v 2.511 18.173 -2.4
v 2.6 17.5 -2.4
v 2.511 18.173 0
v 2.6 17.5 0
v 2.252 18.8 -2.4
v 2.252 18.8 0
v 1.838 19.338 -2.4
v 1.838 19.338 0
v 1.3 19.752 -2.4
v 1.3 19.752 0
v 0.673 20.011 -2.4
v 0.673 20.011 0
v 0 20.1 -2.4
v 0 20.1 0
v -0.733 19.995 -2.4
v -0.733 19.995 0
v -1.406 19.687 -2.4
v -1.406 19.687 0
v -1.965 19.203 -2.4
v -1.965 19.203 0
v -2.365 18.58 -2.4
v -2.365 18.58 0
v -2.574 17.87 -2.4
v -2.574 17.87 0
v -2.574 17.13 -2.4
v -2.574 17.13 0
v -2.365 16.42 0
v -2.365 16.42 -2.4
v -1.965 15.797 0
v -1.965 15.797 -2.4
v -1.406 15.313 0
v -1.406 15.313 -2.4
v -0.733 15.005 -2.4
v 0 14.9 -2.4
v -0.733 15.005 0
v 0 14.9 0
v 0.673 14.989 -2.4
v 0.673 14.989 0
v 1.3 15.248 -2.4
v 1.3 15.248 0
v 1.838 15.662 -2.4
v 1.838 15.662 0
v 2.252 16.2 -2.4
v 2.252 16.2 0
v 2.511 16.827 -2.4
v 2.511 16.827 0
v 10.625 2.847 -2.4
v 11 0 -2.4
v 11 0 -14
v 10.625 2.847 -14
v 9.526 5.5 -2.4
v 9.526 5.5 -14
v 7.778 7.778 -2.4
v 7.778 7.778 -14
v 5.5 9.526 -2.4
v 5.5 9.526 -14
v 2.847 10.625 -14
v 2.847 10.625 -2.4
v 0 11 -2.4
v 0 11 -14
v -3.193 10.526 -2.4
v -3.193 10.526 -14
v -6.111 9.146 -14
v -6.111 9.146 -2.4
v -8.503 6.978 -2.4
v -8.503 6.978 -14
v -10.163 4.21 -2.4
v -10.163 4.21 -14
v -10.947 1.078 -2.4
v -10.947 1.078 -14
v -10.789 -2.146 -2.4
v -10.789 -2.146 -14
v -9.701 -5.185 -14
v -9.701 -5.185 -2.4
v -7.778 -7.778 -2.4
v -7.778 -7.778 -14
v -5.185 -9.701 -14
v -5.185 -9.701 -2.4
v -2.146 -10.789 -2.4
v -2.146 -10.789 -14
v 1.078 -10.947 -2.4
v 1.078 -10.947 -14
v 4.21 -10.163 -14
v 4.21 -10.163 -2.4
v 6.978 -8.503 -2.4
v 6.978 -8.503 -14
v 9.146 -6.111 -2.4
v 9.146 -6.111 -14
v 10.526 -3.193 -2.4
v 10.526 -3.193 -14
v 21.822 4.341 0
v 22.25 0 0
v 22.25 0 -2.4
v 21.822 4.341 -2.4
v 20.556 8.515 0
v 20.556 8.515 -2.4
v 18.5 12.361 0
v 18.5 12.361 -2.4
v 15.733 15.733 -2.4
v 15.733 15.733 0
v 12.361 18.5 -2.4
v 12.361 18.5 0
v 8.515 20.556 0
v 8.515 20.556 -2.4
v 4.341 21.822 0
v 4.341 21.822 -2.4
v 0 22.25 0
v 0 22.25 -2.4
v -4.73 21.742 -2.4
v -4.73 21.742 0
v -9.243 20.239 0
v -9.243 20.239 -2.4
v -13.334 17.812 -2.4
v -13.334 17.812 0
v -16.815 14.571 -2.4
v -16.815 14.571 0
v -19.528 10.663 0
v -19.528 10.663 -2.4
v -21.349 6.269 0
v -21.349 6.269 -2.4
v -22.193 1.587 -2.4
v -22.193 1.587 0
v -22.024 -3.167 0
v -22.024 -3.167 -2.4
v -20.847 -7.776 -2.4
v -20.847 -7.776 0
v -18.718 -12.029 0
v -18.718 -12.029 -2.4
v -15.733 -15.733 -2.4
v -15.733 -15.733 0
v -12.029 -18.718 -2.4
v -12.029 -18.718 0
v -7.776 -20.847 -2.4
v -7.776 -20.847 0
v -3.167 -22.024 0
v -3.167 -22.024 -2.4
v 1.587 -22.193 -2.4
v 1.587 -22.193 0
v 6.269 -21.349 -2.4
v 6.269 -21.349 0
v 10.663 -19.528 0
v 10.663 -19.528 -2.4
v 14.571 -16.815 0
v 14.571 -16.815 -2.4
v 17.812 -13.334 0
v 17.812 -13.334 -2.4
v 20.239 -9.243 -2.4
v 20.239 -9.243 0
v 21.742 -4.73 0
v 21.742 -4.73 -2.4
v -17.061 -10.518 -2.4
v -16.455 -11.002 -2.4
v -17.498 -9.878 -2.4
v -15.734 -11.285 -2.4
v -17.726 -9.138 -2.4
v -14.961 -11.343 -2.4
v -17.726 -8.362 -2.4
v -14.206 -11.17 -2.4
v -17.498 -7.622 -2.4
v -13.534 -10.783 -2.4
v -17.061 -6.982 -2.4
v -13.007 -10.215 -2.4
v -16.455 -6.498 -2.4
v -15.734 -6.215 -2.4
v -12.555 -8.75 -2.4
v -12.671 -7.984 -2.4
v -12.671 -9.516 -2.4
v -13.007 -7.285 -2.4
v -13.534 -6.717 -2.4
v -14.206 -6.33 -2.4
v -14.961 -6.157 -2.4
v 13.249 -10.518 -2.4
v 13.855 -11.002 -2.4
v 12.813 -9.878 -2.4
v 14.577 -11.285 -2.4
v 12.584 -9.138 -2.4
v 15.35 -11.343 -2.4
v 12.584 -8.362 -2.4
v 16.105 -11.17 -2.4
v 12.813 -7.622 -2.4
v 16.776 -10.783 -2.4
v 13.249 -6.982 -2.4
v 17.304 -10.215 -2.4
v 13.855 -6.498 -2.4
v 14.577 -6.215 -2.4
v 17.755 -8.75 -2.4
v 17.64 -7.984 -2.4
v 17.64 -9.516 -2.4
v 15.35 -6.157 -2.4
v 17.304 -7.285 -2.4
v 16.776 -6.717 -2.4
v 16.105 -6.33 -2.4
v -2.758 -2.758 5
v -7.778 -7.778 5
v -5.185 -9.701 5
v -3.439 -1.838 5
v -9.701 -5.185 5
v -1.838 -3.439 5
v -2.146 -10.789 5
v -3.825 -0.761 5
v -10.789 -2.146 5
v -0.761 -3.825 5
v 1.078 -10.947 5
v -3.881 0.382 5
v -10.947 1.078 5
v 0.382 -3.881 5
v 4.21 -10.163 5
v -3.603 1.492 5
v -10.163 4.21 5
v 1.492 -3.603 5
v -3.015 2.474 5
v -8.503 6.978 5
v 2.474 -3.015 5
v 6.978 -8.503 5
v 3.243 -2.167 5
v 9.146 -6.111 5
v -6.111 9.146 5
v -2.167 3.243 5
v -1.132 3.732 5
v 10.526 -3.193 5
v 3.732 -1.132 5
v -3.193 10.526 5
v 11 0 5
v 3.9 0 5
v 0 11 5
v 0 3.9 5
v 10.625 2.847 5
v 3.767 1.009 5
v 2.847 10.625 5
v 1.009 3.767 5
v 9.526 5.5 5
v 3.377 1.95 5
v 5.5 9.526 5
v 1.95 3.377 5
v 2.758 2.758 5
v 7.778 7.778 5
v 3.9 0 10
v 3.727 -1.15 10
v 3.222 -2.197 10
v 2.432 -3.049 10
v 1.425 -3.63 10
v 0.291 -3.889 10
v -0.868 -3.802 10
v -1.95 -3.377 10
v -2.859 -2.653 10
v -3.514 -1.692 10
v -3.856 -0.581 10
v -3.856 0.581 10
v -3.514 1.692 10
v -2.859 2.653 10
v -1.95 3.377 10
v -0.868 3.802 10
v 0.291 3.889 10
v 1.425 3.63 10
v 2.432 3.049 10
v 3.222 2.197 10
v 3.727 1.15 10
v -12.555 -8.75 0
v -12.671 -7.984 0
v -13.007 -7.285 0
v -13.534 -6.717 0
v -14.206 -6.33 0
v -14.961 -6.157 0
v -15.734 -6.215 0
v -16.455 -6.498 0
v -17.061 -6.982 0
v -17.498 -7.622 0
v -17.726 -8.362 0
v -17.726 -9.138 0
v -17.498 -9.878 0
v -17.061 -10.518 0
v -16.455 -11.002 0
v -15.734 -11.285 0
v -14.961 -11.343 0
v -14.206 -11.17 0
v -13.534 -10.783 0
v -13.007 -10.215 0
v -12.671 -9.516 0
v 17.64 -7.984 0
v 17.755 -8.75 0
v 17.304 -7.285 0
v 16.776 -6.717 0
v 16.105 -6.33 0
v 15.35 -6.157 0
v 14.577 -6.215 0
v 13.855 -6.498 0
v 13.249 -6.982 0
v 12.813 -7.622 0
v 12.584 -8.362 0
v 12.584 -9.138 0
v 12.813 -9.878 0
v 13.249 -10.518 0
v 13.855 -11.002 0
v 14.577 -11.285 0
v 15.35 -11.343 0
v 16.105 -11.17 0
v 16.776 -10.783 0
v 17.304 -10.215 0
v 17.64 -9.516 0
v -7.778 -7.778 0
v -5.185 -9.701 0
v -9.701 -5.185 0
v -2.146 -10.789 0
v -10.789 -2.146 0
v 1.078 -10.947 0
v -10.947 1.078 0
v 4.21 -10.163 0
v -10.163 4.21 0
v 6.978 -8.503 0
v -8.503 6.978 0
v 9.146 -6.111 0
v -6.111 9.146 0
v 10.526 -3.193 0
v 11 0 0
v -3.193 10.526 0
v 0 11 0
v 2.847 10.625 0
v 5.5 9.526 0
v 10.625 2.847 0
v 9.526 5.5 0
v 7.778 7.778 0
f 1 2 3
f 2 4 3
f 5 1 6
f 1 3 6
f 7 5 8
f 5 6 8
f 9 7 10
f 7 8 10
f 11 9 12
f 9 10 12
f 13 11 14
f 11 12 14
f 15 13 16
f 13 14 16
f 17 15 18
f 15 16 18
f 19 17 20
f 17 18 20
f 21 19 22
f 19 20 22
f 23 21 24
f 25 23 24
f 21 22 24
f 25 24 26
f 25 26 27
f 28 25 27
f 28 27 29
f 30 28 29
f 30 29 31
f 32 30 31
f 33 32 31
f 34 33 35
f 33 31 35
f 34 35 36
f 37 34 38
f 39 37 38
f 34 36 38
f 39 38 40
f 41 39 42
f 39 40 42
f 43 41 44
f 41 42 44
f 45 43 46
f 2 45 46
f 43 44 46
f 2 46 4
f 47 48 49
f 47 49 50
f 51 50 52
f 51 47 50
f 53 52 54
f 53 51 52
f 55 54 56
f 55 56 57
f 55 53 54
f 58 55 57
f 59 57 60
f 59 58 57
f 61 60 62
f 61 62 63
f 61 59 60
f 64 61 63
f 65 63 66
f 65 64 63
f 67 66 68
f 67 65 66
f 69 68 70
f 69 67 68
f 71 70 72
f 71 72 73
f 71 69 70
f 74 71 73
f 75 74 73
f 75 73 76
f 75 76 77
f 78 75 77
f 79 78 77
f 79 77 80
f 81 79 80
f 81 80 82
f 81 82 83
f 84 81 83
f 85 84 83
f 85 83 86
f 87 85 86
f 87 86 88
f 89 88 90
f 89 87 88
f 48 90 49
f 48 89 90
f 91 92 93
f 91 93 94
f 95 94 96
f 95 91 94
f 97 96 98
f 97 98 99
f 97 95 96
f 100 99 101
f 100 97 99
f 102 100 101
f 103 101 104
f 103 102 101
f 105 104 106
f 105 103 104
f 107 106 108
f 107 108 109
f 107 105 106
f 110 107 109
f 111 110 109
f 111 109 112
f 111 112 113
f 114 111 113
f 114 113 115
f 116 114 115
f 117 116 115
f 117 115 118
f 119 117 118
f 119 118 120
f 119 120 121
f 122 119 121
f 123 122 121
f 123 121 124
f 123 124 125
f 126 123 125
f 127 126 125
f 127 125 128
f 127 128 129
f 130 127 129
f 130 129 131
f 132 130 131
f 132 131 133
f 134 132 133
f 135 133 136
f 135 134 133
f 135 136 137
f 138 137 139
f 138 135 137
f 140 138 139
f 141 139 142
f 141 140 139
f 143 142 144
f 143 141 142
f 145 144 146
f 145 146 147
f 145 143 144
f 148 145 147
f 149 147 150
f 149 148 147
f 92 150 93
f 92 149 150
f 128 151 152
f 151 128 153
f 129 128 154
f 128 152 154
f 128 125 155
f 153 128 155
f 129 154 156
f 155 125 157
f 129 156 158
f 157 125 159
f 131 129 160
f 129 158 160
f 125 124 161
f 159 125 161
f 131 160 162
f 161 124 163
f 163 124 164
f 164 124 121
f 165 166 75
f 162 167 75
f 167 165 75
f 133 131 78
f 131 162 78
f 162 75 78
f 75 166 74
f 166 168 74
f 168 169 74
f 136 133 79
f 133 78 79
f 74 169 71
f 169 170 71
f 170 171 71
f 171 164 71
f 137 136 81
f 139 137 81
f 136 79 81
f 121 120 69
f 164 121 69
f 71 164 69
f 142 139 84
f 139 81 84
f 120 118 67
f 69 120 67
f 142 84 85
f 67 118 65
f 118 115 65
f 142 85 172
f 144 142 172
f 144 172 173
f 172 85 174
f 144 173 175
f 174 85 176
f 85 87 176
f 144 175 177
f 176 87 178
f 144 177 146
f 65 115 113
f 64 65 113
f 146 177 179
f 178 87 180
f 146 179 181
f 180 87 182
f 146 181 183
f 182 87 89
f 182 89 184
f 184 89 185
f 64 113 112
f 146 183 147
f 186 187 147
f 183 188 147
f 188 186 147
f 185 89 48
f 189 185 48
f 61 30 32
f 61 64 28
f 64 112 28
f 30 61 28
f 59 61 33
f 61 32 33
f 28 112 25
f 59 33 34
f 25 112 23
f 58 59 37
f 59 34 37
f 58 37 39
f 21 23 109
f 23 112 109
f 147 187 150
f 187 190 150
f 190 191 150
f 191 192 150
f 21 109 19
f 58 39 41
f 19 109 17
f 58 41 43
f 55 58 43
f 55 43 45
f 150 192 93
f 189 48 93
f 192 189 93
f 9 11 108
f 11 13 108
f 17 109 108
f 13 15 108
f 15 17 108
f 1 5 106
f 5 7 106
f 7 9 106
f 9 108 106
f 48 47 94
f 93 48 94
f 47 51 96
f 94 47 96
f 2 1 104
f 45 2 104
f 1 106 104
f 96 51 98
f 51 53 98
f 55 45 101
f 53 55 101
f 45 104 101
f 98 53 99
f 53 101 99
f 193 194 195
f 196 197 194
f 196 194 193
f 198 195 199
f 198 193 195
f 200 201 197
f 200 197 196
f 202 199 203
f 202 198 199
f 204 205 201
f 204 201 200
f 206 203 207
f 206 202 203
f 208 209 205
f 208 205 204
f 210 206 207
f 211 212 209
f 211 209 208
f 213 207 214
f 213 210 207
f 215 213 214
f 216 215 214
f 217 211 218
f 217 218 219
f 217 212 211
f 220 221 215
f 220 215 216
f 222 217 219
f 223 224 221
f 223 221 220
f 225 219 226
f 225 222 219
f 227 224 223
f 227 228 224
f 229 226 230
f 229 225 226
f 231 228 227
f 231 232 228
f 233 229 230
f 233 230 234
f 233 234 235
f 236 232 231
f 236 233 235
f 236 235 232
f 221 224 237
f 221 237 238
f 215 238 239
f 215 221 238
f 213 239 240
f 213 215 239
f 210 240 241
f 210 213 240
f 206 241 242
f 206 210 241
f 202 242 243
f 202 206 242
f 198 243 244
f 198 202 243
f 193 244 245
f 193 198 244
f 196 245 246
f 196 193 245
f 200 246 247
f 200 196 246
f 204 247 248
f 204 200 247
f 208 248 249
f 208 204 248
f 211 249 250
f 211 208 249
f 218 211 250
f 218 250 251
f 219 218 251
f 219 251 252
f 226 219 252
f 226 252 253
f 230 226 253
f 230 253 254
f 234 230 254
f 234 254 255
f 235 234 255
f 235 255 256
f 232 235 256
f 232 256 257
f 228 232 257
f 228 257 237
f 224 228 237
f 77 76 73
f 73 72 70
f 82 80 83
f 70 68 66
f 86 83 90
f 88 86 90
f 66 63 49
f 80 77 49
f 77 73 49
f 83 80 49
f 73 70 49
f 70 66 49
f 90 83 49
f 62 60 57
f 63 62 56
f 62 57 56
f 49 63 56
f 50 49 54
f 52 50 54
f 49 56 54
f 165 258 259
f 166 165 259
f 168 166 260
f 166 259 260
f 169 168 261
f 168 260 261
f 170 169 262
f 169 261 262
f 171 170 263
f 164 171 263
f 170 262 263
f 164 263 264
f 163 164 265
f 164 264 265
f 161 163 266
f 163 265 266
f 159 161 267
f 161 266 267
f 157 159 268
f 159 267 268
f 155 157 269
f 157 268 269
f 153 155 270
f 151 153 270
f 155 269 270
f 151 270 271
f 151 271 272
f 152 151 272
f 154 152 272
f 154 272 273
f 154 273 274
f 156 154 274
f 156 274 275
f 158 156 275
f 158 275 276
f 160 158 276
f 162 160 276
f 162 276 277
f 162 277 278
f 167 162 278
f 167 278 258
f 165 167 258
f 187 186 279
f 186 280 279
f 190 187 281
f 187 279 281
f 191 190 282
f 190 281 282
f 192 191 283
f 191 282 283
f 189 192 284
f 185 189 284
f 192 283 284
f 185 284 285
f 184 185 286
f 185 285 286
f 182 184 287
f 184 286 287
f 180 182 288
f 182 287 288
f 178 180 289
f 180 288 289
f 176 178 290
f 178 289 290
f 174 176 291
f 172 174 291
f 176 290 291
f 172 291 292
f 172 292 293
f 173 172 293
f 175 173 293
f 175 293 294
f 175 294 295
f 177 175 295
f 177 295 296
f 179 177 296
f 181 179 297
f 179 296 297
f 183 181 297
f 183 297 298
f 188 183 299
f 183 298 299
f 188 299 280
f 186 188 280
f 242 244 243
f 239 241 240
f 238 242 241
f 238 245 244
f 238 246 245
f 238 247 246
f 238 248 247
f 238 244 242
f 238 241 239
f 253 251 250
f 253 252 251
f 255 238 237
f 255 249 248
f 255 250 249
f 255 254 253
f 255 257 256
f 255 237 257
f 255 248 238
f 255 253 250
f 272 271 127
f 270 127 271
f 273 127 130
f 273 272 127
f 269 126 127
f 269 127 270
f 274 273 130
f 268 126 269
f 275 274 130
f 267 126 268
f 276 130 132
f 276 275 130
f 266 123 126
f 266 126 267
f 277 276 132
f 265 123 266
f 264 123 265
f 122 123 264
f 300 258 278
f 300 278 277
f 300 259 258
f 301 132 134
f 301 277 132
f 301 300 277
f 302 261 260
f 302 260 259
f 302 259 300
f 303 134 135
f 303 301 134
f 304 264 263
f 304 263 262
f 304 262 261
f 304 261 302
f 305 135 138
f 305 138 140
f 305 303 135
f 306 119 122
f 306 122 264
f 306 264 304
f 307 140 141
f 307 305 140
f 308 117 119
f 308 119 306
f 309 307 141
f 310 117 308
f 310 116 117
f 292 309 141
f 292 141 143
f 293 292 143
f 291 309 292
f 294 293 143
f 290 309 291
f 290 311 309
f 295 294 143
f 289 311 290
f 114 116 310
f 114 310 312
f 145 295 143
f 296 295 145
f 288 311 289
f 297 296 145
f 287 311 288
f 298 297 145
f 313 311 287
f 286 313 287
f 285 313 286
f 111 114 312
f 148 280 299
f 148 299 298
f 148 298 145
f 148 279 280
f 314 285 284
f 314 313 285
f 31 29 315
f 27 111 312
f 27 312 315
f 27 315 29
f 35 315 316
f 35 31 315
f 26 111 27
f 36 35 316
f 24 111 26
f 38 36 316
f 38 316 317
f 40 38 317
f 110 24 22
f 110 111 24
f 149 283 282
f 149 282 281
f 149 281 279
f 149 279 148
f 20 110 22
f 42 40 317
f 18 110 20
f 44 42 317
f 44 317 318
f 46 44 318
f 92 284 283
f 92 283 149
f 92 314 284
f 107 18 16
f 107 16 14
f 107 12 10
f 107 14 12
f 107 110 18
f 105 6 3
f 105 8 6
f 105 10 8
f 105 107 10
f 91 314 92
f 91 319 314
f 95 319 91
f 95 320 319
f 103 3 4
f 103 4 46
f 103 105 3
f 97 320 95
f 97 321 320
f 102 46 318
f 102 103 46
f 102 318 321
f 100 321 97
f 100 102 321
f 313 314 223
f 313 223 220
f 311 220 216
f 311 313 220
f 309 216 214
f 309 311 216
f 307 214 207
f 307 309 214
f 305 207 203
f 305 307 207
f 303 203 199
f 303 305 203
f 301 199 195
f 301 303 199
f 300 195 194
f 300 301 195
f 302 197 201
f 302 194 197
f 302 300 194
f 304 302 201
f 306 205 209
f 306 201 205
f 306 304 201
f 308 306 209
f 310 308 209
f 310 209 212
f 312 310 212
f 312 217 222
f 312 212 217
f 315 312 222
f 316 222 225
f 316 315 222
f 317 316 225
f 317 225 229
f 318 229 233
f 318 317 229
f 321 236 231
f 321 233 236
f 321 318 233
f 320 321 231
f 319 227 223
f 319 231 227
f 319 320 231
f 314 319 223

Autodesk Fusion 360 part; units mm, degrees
sketch "Sketch1" plane through (0, 0, 0) normal (0, 0, 1) x (1, 0, 0)
  circle A0 centre (0, 0) radius 22.25
  circle A1 centre (0, 0) radius 17.5
  circle A2 centre (0, 0) radius 11
  line L0 (0, 0) -> (0, 30)
  circle A3 centre (0, 17.5) radius 2.6
  circle A4 centre (-15.1554, -8.75) radius 2.6
  circle A5 centre (15.1554, -8.75) radius 2.6
  circle A6 centre (0, 0) radius 3.9
  dimension "d1" = 44.5
  dimension "d2" = 35
  dimension "d3" = 22
  dimension "d4" = 5.2
  dimension "d5" = 5.2
  dimension "d6" = 5.2
  dimension "d7" = 7.8
extrude "Extrude1" add sketch "Sketch1" against normal blind 2.4 contours A0 | A1 A3 A4 A5 | A2 | A6
extrude "Extrude2" add sketch "Sketch1" along normal blind 5 and the other way blind 14 contours A2 | A6
extrude "Extrude3" add sketch "Sketch1" along normal blind 10 contours A6
